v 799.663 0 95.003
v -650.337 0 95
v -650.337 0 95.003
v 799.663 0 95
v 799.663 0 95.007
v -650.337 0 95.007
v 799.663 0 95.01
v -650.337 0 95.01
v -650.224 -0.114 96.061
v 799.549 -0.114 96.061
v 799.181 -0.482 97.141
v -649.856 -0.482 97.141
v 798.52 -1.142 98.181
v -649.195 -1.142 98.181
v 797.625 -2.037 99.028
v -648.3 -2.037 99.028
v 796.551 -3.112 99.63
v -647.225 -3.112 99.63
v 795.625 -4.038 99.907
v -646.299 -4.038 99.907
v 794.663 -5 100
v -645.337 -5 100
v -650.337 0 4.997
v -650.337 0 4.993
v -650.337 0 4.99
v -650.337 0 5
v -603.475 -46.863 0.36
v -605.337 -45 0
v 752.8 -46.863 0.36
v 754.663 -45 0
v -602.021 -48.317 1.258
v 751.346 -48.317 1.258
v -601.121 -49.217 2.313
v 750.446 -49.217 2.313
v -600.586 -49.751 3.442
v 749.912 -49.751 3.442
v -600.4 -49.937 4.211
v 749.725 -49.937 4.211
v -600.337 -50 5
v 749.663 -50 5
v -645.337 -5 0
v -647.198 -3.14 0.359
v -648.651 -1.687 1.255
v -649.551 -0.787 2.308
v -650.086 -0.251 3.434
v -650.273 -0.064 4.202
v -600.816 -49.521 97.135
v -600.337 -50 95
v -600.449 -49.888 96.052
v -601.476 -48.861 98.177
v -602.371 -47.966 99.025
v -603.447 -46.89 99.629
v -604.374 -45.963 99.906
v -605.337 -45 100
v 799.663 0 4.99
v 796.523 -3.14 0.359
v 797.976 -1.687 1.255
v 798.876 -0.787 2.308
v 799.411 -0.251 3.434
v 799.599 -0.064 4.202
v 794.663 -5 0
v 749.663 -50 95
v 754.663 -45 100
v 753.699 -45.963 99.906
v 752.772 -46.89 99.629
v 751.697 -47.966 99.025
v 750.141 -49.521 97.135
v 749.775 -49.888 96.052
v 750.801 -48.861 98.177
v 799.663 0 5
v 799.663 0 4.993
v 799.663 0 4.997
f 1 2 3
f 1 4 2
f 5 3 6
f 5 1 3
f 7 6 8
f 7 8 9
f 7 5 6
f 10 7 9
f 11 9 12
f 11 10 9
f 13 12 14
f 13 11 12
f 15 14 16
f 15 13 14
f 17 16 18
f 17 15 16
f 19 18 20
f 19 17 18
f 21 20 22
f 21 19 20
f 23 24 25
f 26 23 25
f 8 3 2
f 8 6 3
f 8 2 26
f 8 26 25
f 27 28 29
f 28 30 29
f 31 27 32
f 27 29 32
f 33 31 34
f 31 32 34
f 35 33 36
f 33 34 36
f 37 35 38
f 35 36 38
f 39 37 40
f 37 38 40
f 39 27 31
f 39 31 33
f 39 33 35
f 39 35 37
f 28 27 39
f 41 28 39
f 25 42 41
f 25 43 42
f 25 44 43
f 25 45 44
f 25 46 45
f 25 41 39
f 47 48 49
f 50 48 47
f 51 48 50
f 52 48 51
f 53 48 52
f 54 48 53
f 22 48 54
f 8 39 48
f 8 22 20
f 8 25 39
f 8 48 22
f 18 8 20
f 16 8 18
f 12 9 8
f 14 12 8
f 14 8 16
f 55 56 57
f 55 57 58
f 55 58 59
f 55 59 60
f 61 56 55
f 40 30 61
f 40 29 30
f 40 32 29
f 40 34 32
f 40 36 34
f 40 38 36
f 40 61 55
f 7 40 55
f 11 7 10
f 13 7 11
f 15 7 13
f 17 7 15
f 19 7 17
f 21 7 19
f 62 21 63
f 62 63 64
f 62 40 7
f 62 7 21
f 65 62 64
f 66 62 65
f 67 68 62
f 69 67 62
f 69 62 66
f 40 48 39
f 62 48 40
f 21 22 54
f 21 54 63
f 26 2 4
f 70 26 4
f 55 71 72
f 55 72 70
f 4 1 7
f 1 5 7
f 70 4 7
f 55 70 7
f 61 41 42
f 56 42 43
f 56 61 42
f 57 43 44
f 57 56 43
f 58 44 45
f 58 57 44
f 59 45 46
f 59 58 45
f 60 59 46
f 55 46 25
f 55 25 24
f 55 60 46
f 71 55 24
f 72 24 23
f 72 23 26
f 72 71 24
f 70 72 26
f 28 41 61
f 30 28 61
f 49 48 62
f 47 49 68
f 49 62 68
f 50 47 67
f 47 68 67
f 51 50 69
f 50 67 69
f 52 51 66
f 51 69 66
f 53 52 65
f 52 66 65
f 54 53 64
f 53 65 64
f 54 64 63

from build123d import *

# Parameters (mm, degrees)
F0_W     = 1450
F0_H     = 100
F4_DEPTH = 50
F1_SIZE  = 49.99999
F2_SIZE  = 49.99999
F3_R     = 5


# Not quite as in the source:
# - a fillet or chamfer is up to 0.001 mm smaller than in the source, because OpenCascade refuses the exact size


with BuildPart() as f4:
    # F0 (on Front) → F4 (new body)
    with BuildSketch(Plane.XZ):
        with Locations((74.6626051481, 50)):
            Rectangle(F0_W, F0_H)
    extrude(amount=F4_DEPTH)

    # F1 (size 50 in the source; OpenCascade refuses exactly that, so slightly less here)
    f1_edges = [f4.edges().sort_by_distance(p)[0] for p in [
        (799.662605, -50, 50),
    ]]
    chamfer(f1_edges, length=F1_SIZE)

    # F2 (size 50 in the source; OpenCascade refuses exactly that, so slightly less here)
    f2_edges = [f4.edges().sort_by_distance(p)[0] for p in [
        (-650.337395, -50, 50),
    ]]
    chamfer(f2_edges, length=F2_SIZE)

    # F3
    f3_edges = [f4.edges().sort_by_distance(p)[0] for p in [
        (74.662605, -50, 100),
        (74.662605, -50, 0),
        (74.662605, 0, 100),
        (74.662605, 0, 0),
    ]]
    fillet(f3_edges, radius=F3_R)


solid = f4.part
